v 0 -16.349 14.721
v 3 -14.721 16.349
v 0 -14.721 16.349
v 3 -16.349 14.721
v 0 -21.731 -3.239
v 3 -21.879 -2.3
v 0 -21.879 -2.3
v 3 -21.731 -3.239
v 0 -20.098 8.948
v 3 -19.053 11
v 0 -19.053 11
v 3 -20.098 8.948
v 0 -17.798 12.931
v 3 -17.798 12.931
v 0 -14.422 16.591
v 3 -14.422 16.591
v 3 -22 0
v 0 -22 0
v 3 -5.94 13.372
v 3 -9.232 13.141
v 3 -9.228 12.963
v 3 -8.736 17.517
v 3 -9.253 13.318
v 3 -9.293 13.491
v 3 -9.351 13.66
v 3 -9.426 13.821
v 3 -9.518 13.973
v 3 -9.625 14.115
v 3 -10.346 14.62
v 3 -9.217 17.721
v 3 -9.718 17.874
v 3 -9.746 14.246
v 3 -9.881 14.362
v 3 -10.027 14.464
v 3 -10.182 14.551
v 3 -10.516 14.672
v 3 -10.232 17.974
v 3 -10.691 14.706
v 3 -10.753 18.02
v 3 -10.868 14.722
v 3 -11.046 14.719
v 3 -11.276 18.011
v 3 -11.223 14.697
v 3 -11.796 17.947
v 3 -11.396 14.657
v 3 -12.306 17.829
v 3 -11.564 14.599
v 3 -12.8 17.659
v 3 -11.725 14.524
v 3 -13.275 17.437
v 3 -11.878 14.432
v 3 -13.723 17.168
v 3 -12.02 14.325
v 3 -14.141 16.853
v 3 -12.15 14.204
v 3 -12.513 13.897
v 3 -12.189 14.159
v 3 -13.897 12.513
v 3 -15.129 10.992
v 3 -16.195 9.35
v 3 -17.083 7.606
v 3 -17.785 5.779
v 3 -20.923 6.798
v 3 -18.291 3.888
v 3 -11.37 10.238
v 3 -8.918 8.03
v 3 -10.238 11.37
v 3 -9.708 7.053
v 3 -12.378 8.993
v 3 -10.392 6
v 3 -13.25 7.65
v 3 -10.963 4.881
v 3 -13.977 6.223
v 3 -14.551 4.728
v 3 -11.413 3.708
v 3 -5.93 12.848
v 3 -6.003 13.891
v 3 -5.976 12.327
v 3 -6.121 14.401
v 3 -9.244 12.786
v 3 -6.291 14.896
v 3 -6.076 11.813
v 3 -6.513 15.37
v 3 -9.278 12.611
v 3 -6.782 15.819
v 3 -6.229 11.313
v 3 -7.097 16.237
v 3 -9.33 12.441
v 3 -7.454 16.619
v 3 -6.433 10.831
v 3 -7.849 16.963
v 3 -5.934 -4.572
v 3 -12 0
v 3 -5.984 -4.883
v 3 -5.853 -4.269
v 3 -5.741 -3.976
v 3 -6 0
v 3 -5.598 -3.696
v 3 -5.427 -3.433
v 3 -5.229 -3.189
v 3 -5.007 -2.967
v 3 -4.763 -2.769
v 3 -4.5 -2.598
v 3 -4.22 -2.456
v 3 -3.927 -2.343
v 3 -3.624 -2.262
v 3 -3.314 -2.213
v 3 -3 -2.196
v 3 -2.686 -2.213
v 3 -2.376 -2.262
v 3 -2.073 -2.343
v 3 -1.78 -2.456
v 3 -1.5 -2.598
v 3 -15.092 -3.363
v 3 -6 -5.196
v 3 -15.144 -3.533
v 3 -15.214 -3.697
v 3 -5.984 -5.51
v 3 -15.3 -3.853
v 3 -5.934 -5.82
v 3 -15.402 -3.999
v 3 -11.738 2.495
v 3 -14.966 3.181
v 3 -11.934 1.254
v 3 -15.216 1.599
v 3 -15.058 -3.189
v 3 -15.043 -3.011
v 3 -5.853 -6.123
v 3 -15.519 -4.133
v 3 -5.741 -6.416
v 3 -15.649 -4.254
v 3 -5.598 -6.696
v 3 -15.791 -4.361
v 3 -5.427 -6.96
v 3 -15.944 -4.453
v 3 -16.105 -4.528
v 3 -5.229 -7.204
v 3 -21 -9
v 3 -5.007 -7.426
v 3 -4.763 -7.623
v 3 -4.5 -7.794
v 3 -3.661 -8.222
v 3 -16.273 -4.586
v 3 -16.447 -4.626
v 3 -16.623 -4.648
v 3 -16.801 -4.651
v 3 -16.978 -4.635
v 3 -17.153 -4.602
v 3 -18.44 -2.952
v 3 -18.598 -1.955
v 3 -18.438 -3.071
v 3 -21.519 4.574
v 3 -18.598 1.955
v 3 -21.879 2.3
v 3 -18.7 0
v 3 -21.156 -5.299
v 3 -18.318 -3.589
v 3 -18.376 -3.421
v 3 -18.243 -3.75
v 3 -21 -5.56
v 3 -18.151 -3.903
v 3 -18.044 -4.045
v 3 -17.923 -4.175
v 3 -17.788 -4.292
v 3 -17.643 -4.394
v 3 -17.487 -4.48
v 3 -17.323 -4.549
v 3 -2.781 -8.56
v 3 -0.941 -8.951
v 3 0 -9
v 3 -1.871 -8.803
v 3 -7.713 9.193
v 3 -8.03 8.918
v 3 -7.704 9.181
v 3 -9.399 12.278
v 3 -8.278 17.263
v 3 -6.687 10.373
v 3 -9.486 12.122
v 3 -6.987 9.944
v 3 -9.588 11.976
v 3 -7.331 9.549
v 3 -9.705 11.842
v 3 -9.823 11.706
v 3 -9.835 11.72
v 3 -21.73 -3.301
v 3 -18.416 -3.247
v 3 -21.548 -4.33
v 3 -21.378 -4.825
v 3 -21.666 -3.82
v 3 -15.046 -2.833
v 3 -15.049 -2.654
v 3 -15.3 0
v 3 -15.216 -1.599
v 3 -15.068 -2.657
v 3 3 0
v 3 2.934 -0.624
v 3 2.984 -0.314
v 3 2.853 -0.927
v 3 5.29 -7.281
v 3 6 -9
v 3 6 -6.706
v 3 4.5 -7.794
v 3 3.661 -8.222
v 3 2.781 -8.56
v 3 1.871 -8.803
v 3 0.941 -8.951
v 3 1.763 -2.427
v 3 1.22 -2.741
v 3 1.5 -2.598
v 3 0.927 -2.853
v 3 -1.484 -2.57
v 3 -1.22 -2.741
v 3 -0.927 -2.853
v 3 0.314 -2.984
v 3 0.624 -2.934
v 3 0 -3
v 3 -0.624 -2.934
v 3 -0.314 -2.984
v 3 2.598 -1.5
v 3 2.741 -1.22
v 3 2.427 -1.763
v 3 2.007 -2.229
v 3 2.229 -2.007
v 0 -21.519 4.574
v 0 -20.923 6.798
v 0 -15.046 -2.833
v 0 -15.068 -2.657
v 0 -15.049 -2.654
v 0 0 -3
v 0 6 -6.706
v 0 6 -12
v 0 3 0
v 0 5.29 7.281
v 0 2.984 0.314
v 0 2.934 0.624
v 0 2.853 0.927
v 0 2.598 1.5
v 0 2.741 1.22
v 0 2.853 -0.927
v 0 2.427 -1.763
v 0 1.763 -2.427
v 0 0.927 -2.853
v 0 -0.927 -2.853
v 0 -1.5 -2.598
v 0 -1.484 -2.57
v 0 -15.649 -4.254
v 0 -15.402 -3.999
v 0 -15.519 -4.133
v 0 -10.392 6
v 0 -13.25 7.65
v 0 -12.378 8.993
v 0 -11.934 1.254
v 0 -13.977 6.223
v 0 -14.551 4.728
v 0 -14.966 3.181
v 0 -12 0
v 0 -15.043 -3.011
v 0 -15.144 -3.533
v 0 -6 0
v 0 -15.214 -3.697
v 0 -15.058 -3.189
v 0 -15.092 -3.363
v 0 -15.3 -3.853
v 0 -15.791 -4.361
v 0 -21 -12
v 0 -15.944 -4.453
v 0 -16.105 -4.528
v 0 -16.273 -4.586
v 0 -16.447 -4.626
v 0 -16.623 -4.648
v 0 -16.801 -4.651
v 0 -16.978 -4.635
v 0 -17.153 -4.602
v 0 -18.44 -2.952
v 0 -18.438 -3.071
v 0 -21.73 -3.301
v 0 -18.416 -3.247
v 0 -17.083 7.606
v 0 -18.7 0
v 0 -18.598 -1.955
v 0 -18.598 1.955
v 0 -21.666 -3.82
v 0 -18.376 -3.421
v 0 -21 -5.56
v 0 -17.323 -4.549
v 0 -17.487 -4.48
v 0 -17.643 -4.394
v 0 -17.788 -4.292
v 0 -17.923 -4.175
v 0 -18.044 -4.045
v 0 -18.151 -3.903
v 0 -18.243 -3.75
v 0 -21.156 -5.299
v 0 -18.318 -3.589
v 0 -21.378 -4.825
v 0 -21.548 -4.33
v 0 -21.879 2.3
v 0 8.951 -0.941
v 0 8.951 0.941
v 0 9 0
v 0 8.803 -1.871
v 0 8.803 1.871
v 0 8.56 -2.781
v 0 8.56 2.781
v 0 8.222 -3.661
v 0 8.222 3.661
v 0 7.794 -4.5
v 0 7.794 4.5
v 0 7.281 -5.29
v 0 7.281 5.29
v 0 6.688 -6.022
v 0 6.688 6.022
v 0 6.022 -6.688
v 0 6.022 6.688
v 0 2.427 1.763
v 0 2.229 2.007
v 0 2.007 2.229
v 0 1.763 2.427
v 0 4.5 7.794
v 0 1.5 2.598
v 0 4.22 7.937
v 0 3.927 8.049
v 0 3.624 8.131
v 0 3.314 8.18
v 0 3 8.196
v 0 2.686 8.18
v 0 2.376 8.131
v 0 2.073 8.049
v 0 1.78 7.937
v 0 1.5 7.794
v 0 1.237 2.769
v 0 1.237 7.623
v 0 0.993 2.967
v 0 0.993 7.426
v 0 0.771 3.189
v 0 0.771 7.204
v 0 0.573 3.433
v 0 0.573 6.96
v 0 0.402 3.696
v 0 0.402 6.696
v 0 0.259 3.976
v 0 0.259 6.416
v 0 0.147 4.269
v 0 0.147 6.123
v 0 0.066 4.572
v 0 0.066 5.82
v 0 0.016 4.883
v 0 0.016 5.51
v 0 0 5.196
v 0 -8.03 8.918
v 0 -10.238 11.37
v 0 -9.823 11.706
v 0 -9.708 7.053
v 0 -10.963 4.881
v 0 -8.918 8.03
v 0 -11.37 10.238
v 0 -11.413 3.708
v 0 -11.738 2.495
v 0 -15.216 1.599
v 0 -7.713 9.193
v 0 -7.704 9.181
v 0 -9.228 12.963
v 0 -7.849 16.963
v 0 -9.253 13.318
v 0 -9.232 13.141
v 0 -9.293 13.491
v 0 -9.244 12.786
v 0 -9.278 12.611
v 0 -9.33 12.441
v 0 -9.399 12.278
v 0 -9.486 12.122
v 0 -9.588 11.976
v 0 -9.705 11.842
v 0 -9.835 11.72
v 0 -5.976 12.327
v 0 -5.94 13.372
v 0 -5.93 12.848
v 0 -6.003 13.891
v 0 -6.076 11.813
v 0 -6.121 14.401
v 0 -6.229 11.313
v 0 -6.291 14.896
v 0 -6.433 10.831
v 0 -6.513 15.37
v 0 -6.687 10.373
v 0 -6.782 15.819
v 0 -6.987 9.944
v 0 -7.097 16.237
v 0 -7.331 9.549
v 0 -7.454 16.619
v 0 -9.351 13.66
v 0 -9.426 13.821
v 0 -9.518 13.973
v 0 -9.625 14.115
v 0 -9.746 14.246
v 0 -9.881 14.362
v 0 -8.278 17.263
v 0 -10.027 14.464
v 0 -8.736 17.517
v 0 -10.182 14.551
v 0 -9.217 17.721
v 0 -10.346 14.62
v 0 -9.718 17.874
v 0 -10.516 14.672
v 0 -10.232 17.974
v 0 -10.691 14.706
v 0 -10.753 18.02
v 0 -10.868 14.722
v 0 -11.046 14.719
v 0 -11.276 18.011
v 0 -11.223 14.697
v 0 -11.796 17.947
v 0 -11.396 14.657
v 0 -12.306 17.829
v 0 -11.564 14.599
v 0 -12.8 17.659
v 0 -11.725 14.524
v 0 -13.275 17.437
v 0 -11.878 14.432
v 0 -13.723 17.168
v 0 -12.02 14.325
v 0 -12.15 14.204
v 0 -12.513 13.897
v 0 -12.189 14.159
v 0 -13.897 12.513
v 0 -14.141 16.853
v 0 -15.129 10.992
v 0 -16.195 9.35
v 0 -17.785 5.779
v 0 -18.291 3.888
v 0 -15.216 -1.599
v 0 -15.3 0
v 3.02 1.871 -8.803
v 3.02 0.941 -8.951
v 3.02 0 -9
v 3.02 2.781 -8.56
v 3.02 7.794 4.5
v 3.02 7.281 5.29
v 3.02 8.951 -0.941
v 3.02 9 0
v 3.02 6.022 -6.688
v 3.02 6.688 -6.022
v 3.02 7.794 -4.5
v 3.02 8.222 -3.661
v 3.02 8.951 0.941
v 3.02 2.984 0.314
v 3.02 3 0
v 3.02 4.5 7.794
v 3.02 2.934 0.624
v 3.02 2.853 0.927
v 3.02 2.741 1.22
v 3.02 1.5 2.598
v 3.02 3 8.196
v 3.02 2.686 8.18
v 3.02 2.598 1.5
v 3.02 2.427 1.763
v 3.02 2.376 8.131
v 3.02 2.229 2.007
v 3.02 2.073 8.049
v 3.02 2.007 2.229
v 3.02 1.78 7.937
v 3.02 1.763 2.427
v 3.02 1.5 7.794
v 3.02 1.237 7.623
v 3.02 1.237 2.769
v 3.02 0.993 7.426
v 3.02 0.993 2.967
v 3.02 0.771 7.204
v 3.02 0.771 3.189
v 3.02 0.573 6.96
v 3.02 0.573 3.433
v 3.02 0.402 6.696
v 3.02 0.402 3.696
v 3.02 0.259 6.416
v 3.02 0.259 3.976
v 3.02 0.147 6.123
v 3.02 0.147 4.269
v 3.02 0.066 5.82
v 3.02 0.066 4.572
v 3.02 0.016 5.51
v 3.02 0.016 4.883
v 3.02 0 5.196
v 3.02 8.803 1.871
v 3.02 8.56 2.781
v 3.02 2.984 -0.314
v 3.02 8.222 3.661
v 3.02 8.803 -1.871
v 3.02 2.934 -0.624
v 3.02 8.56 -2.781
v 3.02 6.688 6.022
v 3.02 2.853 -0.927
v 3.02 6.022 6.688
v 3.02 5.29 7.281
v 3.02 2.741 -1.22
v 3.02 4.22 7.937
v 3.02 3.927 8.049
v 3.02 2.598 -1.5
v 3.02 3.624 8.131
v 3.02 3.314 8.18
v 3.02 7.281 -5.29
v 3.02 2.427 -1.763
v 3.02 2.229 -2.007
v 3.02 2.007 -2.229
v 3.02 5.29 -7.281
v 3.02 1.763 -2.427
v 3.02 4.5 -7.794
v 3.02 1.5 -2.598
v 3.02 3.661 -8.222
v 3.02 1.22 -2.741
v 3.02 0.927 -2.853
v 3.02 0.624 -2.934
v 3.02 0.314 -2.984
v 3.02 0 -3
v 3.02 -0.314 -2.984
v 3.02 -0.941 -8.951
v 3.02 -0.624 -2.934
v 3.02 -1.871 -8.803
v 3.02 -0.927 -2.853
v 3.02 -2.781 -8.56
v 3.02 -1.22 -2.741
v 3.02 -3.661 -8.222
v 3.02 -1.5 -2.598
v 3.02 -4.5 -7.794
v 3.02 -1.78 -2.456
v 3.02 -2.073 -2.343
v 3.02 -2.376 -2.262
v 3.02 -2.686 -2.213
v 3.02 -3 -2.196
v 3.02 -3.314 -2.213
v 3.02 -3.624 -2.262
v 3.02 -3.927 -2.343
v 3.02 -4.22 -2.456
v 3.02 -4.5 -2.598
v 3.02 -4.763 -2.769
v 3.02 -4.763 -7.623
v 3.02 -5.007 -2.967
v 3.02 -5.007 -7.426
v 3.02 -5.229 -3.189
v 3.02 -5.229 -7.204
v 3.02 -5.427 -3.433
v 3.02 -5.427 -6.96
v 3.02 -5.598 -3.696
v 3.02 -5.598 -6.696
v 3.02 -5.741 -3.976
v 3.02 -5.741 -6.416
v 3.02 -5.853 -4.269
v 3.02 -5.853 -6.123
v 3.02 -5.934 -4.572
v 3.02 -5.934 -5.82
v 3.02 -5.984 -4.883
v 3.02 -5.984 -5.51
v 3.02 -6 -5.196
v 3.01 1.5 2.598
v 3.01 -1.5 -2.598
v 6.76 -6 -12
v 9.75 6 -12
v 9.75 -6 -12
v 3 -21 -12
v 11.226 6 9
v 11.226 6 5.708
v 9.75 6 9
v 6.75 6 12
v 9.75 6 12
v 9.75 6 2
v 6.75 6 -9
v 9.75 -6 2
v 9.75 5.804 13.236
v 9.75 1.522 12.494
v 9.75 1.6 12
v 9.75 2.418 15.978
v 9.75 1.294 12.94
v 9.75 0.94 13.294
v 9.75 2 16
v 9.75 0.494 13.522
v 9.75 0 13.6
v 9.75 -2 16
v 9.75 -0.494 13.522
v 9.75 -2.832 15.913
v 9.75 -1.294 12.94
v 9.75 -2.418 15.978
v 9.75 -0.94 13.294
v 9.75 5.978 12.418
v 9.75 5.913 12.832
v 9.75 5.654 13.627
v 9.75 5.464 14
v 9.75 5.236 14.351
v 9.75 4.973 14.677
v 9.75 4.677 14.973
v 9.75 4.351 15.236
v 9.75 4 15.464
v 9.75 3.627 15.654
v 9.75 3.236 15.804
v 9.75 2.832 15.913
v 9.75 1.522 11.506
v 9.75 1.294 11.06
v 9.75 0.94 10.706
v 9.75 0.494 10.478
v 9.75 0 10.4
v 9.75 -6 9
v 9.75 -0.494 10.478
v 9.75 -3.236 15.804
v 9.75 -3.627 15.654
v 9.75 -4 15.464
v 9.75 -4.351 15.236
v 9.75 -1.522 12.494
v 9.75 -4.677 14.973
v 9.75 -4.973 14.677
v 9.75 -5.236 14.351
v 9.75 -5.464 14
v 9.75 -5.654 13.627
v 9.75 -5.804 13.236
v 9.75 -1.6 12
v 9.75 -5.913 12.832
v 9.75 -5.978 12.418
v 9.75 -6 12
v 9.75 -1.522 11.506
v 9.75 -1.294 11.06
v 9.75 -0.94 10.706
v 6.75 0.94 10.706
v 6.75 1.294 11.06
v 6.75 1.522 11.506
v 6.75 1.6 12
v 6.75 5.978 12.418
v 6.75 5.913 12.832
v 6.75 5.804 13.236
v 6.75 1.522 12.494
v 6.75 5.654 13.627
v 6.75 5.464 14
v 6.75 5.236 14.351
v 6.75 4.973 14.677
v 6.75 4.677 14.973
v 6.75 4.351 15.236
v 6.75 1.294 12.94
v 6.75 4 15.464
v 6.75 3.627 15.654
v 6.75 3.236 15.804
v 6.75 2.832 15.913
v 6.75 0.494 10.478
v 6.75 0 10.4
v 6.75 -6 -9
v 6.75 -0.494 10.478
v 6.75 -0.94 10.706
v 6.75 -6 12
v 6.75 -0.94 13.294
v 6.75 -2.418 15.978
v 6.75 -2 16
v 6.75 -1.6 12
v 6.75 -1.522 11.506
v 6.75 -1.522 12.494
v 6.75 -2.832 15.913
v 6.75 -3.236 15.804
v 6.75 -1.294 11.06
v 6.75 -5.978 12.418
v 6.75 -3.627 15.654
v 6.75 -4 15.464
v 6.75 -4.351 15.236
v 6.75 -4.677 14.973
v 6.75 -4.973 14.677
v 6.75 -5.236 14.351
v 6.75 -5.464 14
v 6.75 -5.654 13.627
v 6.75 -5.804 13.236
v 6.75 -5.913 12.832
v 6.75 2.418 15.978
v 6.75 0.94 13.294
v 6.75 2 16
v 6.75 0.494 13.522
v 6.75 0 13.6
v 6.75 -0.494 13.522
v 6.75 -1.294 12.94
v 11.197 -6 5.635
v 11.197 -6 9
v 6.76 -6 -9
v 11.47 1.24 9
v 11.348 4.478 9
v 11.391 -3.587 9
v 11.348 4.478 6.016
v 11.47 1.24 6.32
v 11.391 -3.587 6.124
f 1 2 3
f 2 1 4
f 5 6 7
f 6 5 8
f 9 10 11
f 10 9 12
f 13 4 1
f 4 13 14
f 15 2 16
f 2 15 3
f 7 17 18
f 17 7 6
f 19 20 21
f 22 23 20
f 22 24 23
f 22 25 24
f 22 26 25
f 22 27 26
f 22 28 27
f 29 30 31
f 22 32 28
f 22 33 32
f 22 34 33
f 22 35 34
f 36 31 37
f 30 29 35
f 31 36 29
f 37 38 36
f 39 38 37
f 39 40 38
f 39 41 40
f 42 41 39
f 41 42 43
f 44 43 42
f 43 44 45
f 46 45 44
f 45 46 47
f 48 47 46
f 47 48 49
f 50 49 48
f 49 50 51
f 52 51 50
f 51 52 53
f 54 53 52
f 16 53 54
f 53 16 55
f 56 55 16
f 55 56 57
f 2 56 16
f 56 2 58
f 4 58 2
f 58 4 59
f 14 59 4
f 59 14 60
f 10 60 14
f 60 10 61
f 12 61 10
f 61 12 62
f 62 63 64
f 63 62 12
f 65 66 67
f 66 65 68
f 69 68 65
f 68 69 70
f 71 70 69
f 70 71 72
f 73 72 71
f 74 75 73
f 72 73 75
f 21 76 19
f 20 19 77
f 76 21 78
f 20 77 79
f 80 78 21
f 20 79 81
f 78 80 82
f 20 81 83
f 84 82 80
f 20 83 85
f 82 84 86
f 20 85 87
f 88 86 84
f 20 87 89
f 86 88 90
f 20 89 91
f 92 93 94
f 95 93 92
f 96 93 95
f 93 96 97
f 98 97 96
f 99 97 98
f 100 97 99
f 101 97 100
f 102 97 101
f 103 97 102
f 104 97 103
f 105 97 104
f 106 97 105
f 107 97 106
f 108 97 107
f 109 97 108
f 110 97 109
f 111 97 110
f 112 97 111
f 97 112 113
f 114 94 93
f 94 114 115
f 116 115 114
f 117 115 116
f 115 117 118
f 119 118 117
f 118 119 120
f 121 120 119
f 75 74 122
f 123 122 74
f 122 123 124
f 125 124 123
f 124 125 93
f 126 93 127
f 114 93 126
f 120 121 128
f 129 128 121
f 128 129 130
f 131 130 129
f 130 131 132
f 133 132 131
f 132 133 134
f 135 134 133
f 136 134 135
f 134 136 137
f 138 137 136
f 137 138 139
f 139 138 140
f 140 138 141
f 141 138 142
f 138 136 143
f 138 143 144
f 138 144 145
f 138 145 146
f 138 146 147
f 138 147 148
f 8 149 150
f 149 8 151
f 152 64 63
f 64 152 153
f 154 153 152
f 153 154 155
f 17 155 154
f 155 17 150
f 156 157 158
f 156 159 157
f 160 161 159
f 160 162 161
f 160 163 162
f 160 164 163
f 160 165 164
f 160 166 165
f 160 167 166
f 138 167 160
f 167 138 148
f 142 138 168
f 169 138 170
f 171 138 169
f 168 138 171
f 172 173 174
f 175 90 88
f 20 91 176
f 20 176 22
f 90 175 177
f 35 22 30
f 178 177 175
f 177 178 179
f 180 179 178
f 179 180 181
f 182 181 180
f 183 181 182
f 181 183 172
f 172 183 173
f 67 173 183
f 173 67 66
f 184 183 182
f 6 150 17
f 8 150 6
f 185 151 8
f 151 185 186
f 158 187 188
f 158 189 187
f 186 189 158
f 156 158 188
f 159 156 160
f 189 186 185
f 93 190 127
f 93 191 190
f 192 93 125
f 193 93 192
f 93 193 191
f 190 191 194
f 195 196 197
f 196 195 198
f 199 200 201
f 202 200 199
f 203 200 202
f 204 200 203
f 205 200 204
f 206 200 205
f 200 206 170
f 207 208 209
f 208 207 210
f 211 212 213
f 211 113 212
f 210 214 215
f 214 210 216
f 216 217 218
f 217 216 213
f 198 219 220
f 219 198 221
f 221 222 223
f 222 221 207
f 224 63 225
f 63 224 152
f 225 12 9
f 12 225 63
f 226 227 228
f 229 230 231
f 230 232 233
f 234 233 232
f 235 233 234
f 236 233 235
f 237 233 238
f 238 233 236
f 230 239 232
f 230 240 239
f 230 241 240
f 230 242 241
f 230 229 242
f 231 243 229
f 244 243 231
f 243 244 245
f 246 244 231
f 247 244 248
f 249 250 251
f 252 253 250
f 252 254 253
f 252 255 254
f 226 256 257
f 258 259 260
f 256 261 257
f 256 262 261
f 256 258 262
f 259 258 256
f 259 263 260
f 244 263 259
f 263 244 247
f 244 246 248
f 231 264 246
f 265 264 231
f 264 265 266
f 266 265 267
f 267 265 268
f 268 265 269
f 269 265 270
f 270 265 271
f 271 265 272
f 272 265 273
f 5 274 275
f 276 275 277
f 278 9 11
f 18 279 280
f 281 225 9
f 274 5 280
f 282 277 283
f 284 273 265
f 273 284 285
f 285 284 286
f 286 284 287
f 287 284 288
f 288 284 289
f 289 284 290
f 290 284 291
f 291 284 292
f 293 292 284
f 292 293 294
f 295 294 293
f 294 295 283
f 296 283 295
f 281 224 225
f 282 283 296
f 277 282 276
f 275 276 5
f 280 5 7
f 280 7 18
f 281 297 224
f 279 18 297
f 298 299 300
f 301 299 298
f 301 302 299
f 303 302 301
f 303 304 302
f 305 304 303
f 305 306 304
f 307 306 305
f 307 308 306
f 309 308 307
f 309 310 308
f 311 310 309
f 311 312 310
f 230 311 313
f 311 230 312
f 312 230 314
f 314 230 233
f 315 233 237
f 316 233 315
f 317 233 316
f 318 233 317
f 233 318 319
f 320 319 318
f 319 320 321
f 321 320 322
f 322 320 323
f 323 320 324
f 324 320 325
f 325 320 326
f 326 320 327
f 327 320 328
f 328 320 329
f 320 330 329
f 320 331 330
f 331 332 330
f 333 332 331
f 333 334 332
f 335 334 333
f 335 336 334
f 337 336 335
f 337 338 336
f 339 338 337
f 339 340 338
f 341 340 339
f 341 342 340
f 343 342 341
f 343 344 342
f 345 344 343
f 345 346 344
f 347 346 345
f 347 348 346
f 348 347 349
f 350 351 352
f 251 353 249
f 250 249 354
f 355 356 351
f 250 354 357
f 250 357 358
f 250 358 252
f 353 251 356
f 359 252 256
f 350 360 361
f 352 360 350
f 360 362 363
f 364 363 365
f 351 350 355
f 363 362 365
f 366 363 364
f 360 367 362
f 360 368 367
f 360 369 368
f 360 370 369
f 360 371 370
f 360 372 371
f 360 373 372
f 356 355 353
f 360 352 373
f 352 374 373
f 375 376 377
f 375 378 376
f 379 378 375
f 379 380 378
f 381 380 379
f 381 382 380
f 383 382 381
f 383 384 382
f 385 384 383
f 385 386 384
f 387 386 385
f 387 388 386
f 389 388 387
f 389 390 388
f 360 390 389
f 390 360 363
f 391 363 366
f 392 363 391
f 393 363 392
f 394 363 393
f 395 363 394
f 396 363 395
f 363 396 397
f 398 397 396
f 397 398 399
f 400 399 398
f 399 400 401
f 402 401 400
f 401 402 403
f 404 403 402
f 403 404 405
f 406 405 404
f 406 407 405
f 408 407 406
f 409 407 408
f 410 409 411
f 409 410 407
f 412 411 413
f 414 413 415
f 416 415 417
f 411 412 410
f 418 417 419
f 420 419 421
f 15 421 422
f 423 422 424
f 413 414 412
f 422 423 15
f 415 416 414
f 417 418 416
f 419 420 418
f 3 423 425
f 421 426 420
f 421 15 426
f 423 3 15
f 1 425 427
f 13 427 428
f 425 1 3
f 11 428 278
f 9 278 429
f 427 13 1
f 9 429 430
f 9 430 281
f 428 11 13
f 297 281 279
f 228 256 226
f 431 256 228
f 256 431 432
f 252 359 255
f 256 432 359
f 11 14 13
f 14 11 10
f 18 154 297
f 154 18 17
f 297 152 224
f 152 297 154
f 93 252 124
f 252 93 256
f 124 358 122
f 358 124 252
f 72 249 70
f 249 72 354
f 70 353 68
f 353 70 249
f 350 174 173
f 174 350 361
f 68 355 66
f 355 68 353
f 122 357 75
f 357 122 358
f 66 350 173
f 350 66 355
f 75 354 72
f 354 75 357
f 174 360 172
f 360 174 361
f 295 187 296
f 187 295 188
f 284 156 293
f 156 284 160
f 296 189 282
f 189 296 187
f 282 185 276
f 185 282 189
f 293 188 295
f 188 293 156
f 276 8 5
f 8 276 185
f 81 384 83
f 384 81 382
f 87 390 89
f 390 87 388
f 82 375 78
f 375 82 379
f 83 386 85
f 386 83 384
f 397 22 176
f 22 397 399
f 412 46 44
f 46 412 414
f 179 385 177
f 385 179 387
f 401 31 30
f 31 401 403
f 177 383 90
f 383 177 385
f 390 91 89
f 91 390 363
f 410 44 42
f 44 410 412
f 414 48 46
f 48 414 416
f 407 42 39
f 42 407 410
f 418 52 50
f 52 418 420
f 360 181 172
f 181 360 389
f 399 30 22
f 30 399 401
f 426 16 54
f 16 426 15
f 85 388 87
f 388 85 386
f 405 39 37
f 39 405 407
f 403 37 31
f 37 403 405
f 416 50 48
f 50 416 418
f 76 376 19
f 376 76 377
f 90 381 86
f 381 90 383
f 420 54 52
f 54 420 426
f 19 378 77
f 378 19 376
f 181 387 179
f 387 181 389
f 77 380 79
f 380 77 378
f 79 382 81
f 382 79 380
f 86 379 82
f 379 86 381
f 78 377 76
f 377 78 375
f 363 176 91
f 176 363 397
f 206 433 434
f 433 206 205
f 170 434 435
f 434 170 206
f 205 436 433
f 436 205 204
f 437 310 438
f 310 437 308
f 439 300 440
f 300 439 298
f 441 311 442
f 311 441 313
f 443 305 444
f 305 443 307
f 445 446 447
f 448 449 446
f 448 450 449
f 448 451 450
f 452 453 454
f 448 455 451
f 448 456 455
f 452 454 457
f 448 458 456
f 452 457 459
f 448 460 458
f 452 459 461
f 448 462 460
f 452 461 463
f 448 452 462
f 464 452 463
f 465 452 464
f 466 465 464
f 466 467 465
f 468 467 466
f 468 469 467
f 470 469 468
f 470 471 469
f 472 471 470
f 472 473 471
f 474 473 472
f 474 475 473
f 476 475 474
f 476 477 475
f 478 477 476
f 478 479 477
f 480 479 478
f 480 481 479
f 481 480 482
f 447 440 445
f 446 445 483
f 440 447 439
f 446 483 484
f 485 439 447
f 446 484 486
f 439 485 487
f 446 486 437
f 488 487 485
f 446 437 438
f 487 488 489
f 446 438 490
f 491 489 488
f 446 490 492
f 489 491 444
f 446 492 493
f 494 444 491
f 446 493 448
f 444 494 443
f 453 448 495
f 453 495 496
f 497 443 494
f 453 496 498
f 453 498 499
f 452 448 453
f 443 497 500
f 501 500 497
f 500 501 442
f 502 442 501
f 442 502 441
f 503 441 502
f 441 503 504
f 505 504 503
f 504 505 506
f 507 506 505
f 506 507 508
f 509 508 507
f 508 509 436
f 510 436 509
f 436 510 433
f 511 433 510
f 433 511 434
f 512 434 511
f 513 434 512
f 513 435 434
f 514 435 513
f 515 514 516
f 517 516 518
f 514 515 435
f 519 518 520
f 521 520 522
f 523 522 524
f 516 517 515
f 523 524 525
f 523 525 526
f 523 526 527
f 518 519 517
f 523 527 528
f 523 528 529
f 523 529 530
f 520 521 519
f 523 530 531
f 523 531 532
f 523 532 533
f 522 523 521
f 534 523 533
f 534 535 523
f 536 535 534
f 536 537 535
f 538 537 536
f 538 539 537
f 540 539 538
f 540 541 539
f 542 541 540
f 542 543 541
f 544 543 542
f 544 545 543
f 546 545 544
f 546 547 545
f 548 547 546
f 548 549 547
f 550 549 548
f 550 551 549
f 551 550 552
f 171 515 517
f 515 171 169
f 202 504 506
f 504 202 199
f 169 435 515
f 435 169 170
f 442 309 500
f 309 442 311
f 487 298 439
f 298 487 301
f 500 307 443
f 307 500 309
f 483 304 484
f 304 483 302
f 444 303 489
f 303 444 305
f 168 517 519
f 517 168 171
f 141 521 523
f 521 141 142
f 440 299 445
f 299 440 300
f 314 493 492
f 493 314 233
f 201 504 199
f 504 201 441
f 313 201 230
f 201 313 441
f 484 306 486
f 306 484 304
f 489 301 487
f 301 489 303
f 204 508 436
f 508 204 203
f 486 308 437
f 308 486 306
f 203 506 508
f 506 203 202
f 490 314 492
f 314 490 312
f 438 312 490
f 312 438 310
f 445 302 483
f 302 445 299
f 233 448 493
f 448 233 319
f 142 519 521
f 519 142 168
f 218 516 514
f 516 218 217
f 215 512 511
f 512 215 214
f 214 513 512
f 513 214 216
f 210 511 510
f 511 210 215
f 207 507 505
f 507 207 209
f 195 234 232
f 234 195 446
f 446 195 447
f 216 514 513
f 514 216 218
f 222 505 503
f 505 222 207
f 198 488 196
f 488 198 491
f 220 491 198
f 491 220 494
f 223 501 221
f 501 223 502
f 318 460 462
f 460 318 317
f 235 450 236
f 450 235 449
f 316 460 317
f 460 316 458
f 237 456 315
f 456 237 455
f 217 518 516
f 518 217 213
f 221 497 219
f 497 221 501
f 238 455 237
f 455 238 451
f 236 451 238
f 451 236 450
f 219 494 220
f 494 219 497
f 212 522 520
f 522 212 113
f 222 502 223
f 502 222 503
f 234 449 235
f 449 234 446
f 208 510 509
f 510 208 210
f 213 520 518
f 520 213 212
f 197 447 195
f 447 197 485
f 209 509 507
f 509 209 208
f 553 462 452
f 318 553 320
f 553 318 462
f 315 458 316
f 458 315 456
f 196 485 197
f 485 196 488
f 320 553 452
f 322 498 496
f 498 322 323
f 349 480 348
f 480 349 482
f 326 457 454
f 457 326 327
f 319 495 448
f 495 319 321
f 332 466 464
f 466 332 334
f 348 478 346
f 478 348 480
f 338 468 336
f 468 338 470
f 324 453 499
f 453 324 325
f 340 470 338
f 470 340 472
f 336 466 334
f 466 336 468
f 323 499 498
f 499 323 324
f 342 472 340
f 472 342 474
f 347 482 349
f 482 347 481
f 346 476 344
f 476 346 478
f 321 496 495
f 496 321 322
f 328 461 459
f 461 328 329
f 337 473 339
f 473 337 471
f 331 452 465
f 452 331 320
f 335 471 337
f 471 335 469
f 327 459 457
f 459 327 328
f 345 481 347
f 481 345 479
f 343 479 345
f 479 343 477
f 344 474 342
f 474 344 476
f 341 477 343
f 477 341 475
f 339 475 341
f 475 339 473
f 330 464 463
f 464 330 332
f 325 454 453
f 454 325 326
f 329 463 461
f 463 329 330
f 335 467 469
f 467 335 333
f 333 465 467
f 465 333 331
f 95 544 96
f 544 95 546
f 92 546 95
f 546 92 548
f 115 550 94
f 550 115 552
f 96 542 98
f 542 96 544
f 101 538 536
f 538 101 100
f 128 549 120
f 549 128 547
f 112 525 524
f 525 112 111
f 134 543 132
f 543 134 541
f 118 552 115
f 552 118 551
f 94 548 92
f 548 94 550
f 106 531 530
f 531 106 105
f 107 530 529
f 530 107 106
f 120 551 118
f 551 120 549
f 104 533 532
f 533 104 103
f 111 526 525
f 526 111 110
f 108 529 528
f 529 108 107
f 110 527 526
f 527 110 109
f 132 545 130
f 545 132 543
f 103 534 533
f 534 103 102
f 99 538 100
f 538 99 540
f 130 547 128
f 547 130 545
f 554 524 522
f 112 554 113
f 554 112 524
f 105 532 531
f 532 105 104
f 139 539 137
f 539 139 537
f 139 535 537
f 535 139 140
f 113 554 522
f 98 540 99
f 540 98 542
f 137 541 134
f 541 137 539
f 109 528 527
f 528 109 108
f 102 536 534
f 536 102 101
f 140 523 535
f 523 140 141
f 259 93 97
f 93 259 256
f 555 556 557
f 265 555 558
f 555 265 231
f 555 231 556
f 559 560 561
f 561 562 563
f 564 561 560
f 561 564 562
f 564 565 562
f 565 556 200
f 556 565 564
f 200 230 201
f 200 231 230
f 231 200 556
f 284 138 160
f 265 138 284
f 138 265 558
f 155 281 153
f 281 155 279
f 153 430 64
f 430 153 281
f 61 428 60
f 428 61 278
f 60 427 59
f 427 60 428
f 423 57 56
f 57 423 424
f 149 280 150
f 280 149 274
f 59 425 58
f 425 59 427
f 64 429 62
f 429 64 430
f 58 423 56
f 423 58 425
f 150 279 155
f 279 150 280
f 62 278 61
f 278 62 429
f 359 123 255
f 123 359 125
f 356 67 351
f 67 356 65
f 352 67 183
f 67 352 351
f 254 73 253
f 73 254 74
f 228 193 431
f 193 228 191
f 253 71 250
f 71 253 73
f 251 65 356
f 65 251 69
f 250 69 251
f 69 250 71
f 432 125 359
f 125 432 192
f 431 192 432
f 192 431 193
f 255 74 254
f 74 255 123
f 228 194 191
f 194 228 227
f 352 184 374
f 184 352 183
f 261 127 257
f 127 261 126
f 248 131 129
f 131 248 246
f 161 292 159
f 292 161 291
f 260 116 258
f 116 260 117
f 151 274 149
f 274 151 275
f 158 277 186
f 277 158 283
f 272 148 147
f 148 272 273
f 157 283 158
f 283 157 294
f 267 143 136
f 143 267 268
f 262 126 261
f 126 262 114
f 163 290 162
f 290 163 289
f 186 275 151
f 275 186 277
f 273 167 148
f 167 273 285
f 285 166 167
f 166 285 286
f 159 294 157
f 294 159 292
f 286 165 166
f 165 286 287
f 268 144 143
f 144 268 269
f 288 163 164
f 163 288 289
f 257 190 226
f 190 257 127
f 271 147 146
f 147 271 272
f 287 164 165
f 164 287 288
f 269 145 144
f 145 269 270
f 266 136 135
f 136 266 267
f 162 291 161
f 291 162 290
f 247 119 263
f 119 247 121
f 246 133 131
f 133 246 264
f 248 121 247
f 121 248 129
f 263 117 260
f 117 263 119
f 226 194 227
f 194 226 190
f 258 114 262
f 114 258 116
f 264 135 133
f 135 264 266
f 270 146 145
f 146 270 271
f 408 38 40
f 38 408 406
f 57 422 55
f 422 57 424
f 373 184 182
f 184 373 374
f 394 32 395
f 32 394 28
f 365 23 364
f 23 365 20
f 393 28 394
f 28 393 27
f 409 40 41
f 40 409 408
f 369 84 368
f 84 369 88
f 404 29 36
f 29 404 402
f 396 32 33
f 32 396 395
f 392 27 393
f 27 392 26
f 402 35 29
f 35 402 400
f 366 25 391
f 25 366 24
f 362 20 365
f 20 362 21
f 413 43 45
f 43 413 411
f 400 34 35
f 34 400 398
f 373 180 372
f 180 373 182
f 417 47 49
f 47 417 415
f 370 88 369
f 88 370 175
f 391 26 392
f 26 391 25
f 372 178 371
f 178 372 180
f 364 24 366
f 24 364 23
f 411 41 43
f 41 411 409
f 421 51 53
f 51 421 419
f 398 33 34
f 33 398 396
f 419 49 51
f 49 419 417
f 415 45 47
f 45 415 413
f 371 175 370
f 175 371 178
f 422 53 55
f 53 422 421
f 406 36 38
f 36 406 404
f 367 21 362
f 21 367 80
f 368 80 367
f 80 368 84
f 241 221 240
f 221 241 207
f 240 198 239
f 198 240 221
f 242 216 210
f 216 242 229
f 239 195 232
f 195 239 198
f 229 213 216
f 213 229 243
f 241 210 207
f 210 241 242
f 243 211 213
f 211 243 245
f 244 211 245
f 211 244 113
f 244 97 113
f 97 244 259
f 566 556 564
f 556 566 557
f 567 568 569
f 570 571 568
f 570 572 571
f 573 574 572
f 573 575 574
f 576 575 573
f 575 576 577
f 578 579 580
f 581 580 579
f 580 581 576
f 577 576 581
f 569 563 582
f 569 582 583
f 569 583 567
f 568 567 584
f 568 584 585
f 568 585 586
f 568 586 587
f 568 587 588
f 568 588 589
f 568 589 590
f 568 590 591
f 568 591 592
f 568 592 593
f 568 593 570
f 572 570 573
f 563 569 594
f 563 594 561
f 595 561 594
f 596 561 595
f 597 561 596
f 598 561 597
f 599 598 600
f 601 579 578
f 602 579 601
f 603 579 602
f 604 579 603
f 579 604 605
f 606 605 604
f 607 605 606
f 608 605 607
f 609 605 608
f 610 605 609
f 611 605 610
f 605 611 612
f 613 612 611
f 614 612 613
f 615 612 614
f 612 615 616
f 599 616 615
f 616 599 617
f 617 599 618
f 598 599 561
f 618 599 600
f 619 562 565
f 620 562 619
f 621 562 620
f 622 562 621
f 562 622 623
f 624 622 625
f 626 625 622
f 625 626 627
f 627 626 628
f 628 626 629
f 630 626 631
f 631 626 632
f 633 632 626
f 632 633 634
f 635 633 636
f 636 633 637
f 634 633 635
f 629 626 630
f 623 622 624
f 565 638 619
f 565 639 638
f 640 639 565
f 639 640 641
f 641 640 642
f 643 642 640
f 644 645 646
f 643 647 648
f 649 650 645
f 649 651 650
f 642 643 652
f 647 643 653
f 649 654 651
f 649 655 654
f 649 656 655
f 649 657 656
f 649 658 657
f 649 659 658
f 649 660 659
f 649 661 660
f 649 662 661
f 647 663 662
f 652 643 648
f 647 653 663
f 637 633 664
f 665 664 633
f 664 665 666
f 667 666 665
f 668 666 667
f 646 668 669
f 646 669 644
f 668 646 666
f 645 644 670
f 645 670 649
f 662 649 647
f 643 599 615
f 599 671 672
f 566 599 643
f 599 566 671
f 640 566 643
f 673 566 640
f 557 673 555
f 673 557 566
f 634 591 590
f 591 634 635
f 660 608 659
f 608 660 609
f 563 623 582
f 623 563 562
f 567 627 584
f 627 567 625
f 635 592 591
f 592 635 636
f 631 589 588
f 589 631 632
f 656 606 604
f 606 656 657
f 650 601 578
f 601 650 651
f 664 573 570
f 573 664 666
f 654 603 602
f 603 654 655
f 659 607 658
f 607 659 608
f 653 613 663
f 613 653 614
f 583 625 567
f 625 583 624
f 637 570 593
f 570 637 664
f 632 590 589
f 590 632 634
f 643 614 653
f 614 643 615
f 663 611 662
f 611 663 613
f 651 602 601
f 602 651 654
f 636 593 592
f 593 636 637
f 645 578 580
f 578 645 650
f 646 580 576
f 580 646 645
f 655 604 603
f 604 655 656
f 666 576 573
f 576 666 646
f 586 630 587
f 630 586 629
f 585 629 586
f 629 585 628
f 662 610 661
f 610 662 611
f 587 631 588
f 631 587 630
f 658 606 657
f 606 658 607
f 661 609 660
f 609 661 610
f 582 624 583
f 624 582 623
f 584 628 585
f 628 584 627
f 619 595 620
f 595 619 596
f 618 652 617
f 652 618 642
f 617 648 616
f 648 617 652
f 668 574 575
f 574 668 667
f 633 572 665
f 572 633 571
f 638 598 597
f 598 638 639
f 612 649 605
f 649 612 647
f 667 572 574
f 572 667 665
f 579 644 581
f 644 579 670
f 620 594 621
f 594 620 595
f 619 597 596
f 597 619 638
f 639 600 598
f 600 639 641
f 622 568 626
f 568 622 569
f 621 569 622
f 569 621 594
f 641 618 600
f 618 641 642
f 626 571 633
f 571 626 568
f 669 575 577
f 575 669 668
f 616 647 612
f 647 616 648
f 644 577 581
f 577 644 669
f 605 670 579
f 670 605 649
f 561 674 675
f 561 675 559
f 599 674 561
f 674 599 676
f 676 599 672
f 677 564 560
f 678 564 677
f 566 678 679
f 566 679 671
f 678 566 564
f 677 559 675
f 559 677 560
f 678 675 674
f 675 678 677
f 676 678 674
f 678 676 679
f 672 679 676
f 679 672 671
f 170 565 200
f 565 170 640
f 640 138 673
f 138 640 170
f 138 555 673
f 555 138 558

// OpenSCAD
// file: led_strip_holder_bracket_parameters.scad
// led_strip_holder_bracket_parameters.scad



// This file depends on values in curvy_led_strip_holder_parameters.scad.
// Include that file first.

// Mounting Bracket Height: The case shape should not have any severe overhangs below this height. 
mounting_bracket_h = 5.5; 


// Minimum and maximum angle for slide arm holder.
tilt_bracket_min_theta = -10;
tilt_bracket_max_theta = 50;

bracket_circle_fineness = 60; // Affects polygon count. Could affect printed model appearance.

bracket_post_holder_w = 6; // Width of round holder for the LED strip post notch. Also determines clearance for the wider portion of the post. 
bracket_angle_arm_slot_thickness = 1.5*angle_adjustment_arm_thickness; // Thickness of slide arm holder

// Size and position of the bracket base section. These might be replaced with math, but picking numbers that look good is relatively easy.
bracket_base_height = 3;
bracket_base_outer_width = 27;
bracket_base_position_offset = 6;

bracket_base_inner_width = 12; // Width of the bracket upright adjacent to the drone body.
bracket_base_inner_position_offset = bracket_base_inner_width/2; // Position offset. Centered by default.
bracket_inner_thickness = 3; // Thickness of the inner bracket section. 
bracket_inner_height_over_lip = 7; // Vertical distance from the top of the drone to the top of the inner bracket. 
bracket_mounting_screw_height = 3; // Vertical distance from the top of the drone to the attachment screw hole center. 
bracket_mounting_screw_hole_r = 3.2/2; // Radius of the attachment screw hole. (M3 sized)
bracket_inner_top_bevel = 4; // Roundness of the top of the inner bracket.


// Dimensions for a sloped lip to the mounting bracket so it doesn't wobble or tilt when installed. 
// (That would be bad, because it'd create a risk of the LED strips hitting the rotors!
bracket_mounting_lip_depth = 2; 
bracket_mounting_lip_straight_section_height = 2;
bracket_mounting_lip_sloped_section_height = 5;

// Distance from center of Teal Sport body shape to inner edge of straight portion of bracket.
// Used to make the sloped lip exactly match the body shape for a conformal fit.
bracket_distance_from_teal_body = 51.2;
// file: curvy_led_strip_holder_parameters.scad
// curvy_led_strip_holder_parameters.scad
//
// Driving parameters for curvy_led_strip_holder.scad
//
// By Gregg Christopher, 2017
// This file is released under the Creative Commons - Attribution license. 
// http://creativecommons.org/licenses/by/3.0/

// Strip Length Estimates:
// 30 LEDs: 20.8cm
// 32 LEDs: 22.2cm

led_strip_width = 14; // Including weather stripping
led_strip_thickness = 4; // Including weather stripping
led_strip_length = 208; 

// These values are only used for the approximate preview of the LED strip
led_spacing = 1000/144; 
led_width = 5;
led_height = 2;
led_backing_thickness = 0.2;

led_holder_front_thickness = 1.5; // Thickness of LED holder section in front (lit side) of the LED strip
led_holder_back_thickness = 2; // Thickness of holder behind the LEDs
led_holder_side_thickness= 1.5; // Thickness of holder on leading and trailing edge. (Not including the curved section on the leading edge.
led_holder_clip_length = 2; // Length of the strips in front of the LEDs that hold the LED strip in place. 
led_holder_bevel_r = 1; // Roundness of the strip body.
led_holder_leading_edge_r = 1.5; // Radius of the front of the leading edge curved section of the LED strip.
led_holder_bottom_cap_thickness = 2; // Thickness of the solid bottom of the strip that keeps the LEDs from sliding down or contacting the ground. 

led_holder_length = led_strip_length; 

// The LED holder strip consists of a straight center section, then two sections that follow
// a circular arc above and below the center section. (So it curves back toward the drone
// body, then straightens out.) If those circular sections are shorter than the specified
// strip holder length, straight sections are appended to the ends. (If they end up being 
// longer, then change the curve section parameters to get the total length back down to the 
// desired value.)

led_holder_straight_center_length = 15; // Length of the center straight section.

curvy_section_r = 80; // Radius of the circular arc. 
curvy_section_theta = 25; // Arc length of each section, in degrees. (There will be a total of four.)

// Parameters describing the swivel base post and tilt angle adjustment arm.
base_post_length = 6.5;
base_post_r = 5;
base_post_notch_r = 3;
base_post_notch_d = 1;
base_post_notch_w = 3;

angle_adjustment_arm_l = 22;
angle_adjustment_arm_w = base_post_r * 2;
angle_adjustment_arm_thickness  = 2.5;
angle_adjustment_arm_screw_hole_r = 1.7;
// main file
// led_strip_holder_bracket.scad
//
// Bracket to allow adjustable tilt mounting of an LED strip to the side of a
// Teal Sport drone. Requires a matching modified top case with a  bracket 
// attachment point. 
//
// By Gregg Christopher, 2017
// This file is released under the Creative Commons - Attribution license. 
// http://creativecommons.org/licenses/by/3.0/

// Module summary:
//
// module led_strip_holder_bracket() : A bracket with tilt adjustment to mount the LED strip to the side of the drone.
//
// The bottom of this bracket is pretty blocky to make it easy to print. 
//
// TODO: Consider ways to make it prettier and lighter. 
//       In the meantime, this is solvable by sanding off the ugly corners.

// Infinitesimal value for ensuring manifold shapes and other special uses. 
slop = 0.01;

teal_sport_body_height = 18; // Couldn't find dimensional drawings; this is only a guess from images. 

// Get parameters to match the base post and tilt adjustment arm on the LED strip holder.
include <curvy_led_strip_holder_parameters.scad>

include <led_strip_holder_bracket_parameters.scad>

module rounded_circle_arc(radius, width, thickness, min_theta, max_theta) {
  rotate([0, 90, 0]) {
    intersection() {
      difference() {
        cylinder(r = radius + width/2, h = thickness, $fn = bracket_circle_fineness);
        translate([0, 0, -slop])
        cylinder(r = radius - width/2, h = thickness + 2*slop, $fn = bracket_circle_fineness);
      }
      rotate([0, 0, -90 - min_theta])
      translate([-radius - width/2, 0, 0])
      cube([2*radius + width, radius + width, thickness]);
    
      rotate([0, 0, 90 - max_theta])
      translate([-radius - width/2, 0, 0])
      cube([2*radius + width, radius + width, thickness]);
    }

    rotate([0, 0, -min_theta])
    translate([0, radius, 0])
    cylinder(r = width/2, h = thickness, $fn = bracket_circle_fineness);

    rotate([0, 0, -max_theta])
    translate([0, radius, 0])
    cylinder(r = width/2, h = thickness, $fn = bracket_circle_fineness);
    
  }
}

module led_strip_holder_bracket() {
  // Tilt adjustment arm and post holder.
  difference() {
    union() {
      rotate([180, 0, 0])
      rounded_circle_arc(angle_adjustment_arm_l - angle_adjustment_arm_w/2, angle_adjustment_arm_w, base_post_notch_w, tilt_bracket_min_theta, tilt_bracket_max_theta);
      
      rounded_circle_arc(base_post_notch_r + bracket_post_holder_w/2, bracket_post_holder_w, base_post_notch_w + 2*slop, -60, 120);
      
      translate([0, -bracket_base_outer_width + bracket_base_position_offset, -base_post_notch_r - bracket_post_holder_w - bracket_base_height])
      cube([base_post_notch_w, bracket_base_outer_width, bracket_base_height + bracket_post_holder_w + base_post_notch_r]);
    }

    translate([-slop, 0, 0])
    rotate([180, 0, 0])
    rounded_circle_arc(angle_adjustment_arm_l - angle_adjustment_arm_w/2, 2*angle_adjustment_arm_screw_hole_r, base_post_notch_w + 2*slop, tilt_bracket_min_theta, tilt_bracket_max_theta);
    
    rotate([0, 90, 0])
    translate([0, 0, -slop])
    cylinder(r = base_post_notch_r, h = base_post_notch_w + 2*slop, $fn = 20);
    
    rotate([60, 0, 0])
    translate([-slop, -base_post_notch_r, 0])
    cube([base_post_notch_w + 2*slop, 2*base_post_notch_r, 3*base_post_notch_w]);
  }
  
  // Bracket base.
  hull() {
    translate([0, -bracket_base_outer_width + bracket_base_position_offset, -base_post_notch_r - bracket_post_holder_w - bracket_base_height])
    cube([base_post_notch_w, bracket_base_outer_width, bracket_base_height]);

    translate([base_post_notch_w + bracket_angle_arm_slot_thickness, -bracket_base_inner_width + bracket_base_inner_position_offset, -base_post_notch_r - bracket_post_holder_w - bracket_base_height])
    cube([slop, bracket_base_inner_width, bracket_base_height]);
    
  }

  // Bracket inner upright post.
  difference() {
    union() {
      translate([base_post_notch_w + bracket_angle_arm_slot_thickness, -bracket_base_inner_width + bracket_base_inner_position_offset, -base_post_notch_r - bracket_post_holder_w - bracket_base_height])
      cube([bracket_inner_thickness, bracket_base_inner_width, base_post_notch_r + bracket_post_holder_w + bracket_base_height + teal_sport_body_height/2 + bracket_inner_height_over_lip - bracket_inner_top_bevel]);

      hull() {
        translate([base_post_notch_w + bracket_angle_arm_slot_thickness, -bracket_base_inner_width + bracket_base_inner_position_offset + bracket_inner_top_bevel, teal_sport_body_height/2 + bracket_inner_height_over_lip - bracket_inner_top_bevel])
        rotate([0, 90, 0])
        cylinder(r = bracket_inner_top_bevel, h = bracket_inner_thickness, $fn = bracket_circle_fineness);

        translate([base_post_notch_w + bracket_angle_arm_slot_thickness, bracket_base_inner_position_offset - bracket_inner_top_bevel, teal_sport_body_height/2 + bracket_inner_height_over_lip - bracket_inner_top_bevel])
        rotate([0, 90, 0])
        cylinder(r = bracket_inner_top_bevel, h = bracket_inner_thickness, $fn = bracket_circle_fineness);
      }
    }
   
    translate([base_post_notch_w + bracket_angle_arm_slot_thickness - slop, 0, teal_sport_body_height/2 + bracket_mounting_screw_height])
    rotate([0, 90, 0])
    cylinder(r = bracket_mounting_screw_hole_r, h = bracket_inner_thickness + 2*slop, $fn = 20);
  }

  // Sloped lip with inner shape conformal to the side of the Teal Sport drone body.
  difference() {
    hull() {  
      translate([base_post_notch_w + bracket_angle_arm_slot_thickness + bracket_inner_thickness - slop, -bracket_base_inner_width + bracket_base_inner_position_offset, teal_sport_body_height/2 - bracket_mounting_lip_straight_section_height])
      cube([bracket_mounting_lip_depth, bracket_base_inner_width, bracket_mounting_lip_straight_section_height]);
    
      translate([base_post_notch_w + bracket_angle_arm_slot_thickness + bracket_inner_thickness - slop, -bracket_base_inner_width + bracket_base_inner_position_offset, teal_sport_body_height/2 - bracket_mounting_lip_straight_section_height - bracket_mounting_lip_sloped_section_height])
      cube([slop, bracket_base_inner_width, bracket_mounting_lip_straight_section_height]);
    }
    
    // Use the projection of the top cover for the body shape.
    translate([base_post_notch_w + bracket_angle_arm_slot_thickness + bracket_inner_thickness + bracket_distance_from_teal_body, 0, -teal_sport_body_height/2])
    linear_extrude(height = teal_sport_body_height + slop)
    import("teal_top_cover_outline.dxf");
  }
}

translate([base_post_notch_w + bracket_angle_arm_slot_thickness + bracket_inner_thickness + bracket_distance_from_teal_body, 0, -teal_sport_body_height/2])
%linear_extrude(height = teal_sport_body_height + slop)
import("teal_top_cover_outline.dxf");
  
module post_preview() {
  translate([-base_post_notch_d, 0, 0]) {
    rotate([0, 90, 0])
    difference() {
      cylinder(r = base_post_r, h = base_post_length, $fn = 20);
      
      translate([0, 0, base_post_notch_d])
      difference() {
        cylinder(r = base_post_r + 1, h = base_post_notch_w, $fn = 20);
        translate([0, 0, -slop])
        cylinder(r = base_post_notch_r, h = base_post_notch_w + 2*slop, $fn = 20);
      }
    }

    translate([base_post_length - angle_adjustment_arm_thickness, -angle_adjustment_arm_l + angle_adjustment_arm_w/2, -angle_adjustment_arm_w/2]) {
      difference() {
        union() {
          cube([angle_adjustment_arm_thickness, angle_adjustment_arm_l - angle_adjustment_arm_w/2, angle_adjustment_arm_w]);
          translate([0, 0, angle_adjustment_arm_w/2])
          rotate([0, 90, 0])
          cylinder(r = angle_adjustment_arm_w/2, h = angle_adjustment_arm_thickness, $fn = 20);
        }
        translate([-slop, 0, angle_adjustment_arm_w/2])
        rotate([0, 90, 0])
        cylinder(r = angle_adjustment_arm_screw_hole_r, h = angle_adjustment_arm_thickness + 2*slop, $fn = 20);
      }
    }
  }
}

%post_preview();

led_strip_holder_bracket();
